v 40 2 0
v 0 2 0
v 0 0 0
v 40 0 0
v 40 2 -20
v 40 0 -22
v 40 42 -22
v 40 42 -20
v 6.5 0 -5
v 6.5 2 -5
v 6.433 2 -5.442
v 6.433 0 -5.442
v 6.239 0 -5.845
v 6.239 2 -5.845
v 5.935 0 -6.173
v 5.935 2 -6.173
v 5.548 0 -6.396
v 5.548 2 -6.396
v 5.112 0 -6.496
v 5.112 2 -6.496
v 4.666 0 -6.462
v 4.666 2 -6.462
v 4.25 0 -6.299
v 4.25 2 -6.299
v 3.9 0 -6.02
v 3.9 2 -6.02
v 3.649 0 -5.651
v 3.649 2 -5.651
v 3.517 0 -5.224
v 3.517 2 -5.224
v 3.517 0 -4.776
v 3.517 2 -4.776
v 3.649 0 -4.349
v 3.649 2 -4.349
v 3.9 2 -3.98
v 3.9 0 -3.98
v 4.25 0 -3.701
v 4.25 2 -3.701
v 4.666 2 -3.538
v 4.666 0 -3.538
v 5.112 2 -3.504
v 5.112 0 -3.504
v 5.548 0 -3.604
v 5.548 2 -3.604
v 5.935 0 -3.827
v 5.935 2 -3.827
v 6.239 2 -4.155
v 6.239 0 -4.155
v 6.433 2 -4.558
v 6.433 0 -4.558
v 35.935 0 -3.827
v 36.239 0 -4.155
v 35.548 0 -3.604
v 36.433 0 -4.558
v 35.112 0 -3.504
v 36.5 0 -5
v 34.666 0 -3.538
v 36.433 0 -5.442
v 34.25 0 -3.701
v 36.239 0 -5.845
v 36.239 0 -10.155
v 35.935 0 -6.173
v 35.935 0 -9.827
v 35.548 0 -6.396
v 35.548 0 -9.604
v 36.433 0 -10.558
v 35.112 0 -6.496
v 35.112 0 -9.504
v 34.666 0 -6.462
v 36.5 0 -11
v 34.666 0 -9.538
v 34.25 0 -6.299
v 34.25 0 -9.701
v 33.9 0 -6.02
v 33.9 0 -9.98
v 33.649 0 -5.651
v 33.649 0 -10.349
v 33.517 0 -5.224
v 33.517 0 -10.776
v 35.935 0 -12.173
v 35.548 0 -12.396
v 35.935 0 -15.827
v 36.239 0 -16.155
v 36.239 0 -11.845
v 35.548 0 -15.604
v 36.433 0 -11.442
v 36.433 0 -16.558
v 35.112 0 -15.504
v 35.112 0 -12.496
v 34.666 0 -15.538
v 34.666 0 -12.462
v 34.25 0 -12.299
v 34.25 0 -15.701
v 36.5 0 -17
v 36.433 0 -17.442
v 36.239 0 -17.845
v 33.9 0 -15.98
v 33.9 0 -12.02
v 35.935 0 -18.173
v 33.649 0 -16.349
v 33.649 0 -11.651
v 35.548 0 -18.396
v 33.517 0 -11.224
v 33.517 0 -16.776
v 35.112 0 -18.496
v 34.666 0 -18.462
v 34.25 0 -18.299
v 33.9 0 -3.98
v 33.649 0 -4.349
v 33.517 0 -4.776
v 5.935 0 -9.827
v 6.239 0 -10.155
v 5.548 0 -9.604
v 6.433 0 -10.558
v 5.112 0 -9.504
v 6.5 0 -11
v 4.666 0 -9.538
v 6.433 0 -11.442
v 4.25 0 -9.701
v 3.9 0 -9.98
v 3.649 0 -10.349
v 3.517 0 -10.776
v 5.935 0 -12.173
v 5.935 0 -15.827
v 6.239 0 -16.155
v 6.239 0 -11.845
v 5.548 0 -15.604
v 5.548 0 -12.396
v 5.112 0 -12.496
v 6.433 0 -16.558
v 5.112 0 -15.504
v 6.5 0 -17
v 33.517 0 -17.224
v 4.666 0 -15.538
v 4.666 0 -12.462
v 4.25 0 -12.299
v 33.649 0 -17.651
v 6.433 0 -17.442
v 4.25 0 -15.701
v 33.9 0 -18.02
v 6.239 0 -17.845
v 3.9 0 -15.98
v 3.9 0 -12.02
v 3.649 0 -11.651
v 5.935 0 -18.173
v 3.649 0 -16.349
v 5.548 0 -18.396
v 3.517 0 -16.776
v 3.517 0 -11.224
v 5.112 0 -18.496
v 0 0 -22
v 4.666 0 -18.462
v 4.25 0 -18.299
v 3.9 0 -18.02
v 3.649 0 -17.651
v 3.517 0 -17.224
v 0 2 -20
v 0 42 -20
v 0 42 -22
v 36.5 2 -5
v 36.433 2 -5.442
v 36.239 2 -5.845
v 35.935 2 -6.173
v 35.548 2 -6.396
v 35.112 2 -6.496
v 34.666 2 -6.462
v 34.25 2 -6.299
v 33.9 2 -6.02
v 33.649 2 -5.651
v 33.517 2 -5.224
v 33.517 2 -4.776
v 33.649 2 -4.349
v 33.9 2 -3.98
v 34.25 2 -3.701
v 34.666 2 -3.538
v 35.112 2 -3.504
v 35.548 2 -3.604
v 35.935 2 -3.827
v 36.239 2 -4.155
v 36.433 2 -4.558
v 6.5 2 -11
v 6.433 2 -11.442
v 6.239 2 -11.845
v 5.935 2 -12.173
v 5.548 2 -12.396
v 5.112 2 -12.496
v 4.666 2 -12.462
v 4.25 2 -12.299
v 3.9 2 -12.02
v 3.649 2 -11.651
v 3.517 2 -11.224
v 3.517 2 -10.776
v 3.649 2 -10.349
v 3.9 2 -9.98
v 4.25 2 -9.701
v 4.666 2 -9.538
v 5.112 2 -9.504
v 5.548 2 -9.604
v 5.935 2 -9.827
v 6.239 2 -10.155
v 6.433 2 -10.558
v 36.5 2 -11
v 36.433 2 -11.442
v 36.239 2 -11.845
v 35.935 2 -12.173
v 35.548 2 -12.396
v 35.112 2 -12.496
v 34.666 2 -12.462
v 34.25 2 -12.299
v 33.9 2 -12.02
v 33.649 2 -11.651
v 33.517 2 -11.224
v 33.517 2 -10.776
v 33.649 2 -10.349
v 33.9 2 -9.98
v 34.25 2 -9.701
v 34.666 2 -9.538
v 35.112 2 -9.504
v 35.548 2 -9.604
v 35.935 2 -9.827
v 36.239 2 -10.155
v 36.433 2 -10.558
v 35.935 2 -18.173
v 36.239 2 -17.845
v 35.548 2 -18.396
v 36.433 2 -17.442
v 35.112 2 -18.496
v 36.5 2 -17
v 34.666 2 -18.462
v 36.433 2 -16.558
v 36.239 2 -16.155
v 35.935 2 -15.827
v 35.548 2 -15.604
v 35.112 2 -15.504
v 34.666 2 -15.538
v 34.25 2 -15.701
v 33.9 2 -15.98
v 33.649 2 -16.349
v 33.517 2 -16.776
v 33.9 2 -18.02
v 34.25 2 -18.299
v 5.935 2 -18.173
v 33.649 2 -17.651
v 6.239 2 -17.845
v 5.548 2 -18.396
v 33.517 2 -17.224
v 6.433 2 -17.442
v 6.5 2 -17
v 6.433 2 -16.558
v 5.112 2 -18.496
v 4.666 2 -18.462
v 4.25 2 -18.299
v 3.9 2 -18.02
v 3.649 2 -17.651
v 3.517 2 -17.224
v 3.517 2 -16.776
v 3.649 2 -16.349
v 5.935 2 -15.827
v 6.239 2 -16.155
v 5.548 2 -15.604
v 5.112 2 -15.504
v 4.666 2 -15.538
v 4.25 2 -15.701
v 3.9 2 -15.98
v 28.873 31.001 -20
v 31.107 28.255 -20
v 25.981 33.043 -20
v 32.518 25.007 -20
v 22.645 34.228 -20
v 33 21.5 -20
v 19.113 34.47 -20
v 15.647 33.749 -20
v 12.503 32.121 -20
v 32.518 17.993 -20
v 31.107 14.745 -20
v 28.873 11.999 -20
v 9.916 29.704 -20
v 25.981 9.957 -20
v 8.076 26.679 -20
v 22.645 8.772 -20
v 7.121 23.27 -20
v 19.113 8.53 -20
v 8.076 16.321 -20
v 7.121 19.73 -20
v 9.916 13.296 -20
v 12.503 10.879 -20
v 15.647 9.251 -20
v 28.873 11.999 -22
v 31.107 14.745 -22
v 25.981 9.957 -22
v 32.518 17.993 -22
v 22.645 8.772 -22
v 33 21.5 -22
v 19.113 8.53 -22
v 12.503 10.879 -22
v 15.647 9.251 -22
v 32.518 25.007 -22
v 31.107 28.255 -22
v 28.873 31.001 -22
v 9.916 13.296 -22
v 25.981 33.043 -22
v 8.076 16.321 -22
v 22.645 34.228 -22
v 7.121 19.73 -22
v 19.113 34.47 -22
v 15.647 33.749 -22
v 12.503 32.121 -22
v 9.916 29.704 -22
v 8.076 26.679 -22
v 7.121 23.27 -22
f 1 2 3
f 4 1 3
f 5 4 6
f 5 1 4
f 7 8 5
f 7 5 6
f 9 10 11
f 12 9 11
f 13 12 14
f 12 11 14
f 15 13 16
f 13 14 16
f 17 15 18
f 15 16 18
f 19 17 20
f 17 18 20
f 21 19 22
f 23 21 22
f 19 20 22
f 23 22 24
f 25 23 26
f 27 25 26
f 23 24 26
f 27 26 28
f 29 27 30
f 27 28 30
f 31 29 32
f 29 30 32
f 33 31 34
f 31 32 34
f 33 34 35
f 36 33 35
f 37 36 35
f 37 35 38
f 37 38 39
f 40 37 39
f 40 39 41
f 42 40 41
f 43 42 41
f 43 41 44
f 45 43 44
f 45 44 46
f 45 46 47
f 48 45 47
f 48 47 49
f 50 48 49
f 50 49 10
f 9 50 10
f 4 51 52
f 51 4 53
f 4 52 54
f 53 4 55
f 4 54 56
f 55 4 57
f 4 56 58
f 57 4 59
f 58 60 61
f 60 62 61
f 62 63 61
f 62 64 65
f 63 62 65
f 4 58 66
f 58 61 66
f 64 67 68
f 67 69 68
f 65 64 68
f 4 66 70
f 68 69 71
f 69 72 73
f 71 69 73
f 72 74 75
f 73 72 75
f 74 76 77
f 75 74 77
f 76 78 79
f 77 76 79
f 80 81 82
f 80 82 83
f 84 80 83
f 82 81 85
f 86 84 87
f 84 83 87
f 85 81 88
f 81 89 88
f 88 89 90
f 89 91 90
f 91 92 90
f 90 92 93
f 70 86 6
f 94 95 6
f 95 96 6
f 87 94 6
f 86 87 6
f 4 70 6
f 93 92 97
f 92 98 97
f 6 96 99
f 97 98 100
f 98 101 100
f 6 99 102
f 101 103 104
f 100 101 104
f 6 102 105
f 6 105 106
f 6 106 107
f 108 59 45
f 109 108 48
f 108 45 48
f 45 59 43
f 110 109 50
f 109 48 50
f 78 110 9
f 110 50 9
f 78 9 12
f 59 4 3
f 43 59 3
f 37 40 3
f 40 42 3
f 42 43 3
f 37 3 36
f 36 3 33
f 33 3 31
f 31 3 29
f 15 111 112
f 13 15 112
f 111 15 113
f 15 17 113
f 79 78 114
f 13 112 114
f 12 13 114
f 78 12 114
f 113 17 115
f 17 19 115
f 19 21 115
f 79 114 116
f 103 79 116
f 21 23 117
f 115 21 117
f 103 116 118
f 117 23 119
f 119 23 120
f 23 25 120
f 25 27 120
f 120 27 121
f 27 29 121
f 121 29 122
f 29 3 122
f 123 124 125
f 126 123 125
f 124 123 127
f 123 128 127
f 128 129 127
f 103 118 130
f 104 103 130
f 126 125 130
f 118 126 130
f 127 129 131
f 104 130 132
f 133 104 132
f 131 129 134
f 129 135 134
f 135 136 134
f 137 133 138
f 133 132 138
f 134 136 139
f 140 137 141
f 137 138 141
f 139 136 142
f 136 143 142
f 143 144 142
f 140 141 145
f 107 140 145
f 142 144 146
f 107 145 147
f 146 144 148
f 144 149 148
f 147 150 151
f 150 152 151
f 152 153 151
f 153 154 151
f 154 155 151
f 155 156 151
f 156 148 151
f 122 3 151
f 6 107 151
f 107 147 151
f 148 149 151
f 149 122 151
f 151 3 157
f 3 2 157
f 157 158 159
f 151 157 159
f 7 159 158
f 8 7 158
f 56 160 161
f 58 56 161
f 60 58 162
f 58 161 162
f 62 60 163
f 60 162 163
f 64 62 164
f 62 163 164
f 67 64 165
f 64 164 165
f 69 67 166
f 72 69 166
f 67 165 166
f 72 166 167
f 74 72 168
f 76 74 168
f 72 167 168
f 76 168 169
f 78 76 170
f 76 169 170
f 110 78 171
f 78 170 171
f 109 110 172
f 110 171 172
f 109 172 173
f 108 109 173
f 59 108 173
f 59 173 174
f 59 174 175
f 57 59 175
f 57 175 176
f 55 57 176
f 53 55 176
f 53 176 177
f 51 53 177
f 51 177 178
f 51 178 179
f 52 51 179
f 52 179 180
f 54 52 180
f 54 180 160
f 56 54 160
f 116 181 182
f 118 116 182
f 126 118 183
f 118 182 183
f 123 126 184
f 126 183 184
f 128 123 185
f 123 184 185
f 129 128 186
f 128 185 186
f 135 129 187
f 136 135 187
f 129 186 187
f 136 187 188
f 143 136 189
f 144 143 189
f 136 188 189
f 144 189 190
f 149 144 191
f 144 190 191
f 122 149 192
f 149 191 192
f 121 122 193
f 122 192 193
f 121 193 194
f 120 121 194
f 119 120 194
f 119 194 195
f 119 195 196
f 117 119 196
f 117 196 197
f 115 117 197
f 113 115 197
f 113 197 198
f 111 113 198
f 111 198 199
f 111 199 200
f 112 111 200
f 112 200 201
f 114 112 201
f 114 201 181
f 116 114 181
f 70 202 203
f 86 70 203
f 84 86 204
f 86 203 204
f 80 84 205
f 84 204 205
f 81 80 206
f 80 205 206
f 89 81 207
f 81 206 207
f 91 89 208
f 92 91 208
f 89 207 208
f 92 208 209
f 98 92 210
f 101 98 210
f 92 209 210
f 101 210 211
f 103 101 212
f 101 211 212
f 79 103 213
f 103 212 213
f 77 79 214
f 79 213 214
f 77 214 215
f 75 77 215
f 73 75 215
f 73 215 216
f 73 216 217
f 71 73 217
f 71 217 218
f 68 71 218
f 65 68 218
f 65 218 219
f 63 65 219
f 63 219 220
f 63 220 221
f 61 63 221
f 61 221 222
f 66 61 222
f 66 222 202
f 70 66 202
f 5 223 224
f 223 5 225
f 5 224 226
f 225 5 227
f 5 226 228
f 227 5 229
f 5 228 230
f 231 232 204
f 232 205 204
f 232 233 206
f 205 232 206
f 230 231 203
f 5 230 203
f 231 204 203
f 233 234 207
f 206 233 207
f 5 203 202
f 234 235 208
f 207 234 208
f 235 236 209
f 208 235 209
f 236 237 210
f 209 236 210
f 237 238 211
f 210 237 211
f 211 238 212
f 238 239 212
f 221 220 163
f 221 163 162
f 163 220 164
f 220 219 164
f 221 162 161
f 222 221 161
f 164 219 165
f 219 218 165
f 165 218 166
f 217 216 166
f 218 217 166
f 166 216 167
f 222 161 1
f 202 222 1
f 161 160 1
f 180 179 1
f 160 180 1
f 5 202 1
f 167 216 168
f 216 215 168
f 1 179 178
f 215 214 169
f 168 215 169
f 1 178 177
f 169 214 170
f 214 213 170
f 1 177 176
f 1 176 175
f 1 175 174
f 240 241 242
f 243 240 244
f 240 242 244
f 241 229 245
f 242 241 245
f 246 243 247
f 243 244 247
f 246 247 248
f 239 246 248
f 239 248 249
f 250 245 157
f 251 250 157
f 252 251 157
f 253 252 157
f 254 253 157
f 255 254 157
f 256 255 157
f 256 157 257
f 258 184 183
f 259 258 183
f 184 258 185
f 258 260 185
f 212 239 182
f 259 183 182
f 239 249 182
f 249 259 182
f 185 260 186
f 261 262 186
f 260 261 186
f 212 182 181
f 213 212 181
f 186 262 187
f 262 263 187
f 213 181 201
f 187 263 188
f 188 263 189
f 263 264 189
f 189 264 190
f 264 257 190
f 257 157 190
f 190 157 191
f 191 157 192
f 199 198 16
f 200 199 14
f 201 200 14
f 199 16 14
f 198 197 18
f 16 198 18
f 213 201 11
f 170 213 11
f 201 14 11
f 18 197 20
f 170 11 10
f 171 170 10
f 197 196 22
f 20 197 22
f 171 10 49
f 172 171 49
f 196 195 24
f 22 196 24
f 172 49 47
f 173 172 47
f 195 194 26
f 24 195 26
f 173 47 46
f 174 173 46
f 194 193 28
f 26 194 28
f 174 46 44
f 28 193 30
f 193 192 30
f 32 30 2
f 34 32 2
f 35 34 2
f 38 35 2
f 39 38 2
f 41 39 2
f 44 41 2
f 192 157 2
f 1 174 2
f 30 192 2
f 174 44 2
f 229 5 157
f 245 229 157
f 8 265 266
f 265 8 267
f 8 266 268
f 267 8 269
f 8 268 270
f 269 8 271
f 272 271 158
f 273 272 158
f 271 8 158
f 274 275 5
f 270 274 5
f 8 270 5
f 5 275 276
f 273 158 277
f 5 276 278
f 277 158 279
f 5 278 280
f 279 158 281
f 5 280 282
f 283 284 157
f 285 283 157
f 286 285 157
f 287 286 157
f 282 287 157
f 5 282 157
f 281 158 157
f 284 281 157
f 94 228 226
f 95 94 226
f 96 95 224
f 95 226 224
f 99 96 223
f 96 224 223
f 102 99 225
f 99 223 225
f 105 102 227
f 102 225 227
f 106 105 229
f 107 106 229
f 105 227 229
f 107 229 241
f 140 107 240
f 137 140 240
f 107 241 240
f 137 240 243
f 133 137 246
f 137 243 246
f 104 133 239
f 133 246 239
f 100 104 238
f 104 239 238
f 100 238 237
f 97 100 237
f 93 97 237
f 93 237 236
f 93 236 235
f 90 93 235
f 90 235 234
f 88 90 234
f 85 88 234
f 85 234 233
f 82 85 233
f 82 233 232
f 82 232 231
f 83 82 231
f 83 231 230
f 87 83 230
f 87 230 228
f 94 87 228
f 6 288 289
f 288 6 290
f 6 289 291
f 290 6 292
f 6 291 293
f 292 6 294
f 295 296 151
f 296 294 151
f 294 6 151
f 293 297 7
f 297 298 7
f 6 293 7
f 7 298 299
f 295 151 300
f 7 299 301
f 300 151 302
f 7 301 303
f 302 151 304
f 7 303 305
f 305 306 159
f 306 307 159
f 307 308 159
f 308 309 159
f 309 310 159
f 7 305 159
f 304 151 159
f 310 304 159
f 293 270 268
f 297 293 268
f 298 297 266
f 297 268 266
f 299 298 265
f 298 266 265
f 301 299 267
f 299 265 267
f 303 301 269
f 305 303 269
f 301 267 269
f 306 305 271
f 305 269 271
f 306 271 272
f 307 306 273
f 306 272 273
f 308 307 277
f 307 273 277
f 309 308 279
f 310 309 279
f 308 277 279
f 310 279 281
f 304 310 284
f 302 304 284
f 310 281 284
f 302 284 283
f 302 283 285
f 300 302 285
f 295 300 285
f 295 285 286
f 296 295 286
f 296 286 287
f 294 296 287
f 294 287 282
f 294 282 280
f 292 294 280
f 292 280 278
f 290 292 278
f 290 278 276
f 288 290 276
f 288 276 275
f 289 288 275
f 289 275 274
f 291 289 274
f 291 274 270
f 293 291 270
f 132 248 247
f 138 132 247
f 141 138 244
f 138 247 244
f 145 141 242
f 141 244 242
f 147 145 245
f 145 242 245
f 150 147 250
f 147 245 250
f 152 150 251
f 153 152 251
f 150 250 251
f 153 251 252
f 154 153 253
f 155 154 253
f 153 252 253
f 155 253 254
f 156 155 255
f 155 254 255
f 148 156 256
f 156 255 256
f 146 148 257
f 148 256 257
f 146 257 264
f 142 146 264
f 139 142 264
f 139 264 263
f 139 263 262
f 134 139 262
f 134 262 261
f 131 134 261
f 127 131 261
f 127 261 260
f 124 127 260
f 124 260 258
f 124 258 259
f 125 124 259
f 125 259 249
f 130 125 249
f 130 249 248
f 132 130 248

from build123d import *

# Parameters (mm, degrees)
BOSS_EXTRUDE1_DEPTH = 40
SKETCH3_R           = 13
CUT_EXTRUDE1_DEPTH  = 3
SKETCH4_R           = 1.5
CUT_EXTRUDE2_DEPTH  = 3


with BuildPart() as part:
    # Sketch2 → Boss-Extrude1 (new body)
    with BuildSketch(Plane(origin=(0, 0, 0), x_dir=(0, 0, -1), z_dir=(1, 0, 0))):
        Polygon((0, 0), (22, 0), (22, 42), (20, 42), (20, 2), (0, 2), align=None)
    extrude(amount=BOSS_EXTRUDE1_DEPTH)

    # Sketch3 → Cut-Extrude1 (cut, through all)
    with BuildSketch(Plane.XY.offset(-20)):
        with Locations((20, 21.5)):
            Circle(SKETCH3_R)
    extrude(amount=-CUT_EXTRUDE1_DEPTH, mode=Mode.SUBTRACT)

    # Sketch4 → Cut-Extrude2 (cut, through all)
    with BuildSketch(Plane(origin=(0, 2, 0), x_dir=(1, 0, 0), z_dir=(0, 1, 0))):
        with Locations((35, 5)):
            Circle(SKETCH4_R)
        with Locations((5, 5)):
            Circle(SKETCH4_R)
        with Locations((5, 11)):
            Circle(SKETCH4_R)
        with Locations((5, 17)):
            Circle(SKETCH4_R)
        with Locations((35, 11)):
            Circle(SKETCH4_R)
        with Locations((35, 17)):
            Circle(SKETCH4_R)
    extrude(amount=-CUT_EXTRUDE2_DEPTH, mode=Mode.SUBTRACT)


solid = part.part
